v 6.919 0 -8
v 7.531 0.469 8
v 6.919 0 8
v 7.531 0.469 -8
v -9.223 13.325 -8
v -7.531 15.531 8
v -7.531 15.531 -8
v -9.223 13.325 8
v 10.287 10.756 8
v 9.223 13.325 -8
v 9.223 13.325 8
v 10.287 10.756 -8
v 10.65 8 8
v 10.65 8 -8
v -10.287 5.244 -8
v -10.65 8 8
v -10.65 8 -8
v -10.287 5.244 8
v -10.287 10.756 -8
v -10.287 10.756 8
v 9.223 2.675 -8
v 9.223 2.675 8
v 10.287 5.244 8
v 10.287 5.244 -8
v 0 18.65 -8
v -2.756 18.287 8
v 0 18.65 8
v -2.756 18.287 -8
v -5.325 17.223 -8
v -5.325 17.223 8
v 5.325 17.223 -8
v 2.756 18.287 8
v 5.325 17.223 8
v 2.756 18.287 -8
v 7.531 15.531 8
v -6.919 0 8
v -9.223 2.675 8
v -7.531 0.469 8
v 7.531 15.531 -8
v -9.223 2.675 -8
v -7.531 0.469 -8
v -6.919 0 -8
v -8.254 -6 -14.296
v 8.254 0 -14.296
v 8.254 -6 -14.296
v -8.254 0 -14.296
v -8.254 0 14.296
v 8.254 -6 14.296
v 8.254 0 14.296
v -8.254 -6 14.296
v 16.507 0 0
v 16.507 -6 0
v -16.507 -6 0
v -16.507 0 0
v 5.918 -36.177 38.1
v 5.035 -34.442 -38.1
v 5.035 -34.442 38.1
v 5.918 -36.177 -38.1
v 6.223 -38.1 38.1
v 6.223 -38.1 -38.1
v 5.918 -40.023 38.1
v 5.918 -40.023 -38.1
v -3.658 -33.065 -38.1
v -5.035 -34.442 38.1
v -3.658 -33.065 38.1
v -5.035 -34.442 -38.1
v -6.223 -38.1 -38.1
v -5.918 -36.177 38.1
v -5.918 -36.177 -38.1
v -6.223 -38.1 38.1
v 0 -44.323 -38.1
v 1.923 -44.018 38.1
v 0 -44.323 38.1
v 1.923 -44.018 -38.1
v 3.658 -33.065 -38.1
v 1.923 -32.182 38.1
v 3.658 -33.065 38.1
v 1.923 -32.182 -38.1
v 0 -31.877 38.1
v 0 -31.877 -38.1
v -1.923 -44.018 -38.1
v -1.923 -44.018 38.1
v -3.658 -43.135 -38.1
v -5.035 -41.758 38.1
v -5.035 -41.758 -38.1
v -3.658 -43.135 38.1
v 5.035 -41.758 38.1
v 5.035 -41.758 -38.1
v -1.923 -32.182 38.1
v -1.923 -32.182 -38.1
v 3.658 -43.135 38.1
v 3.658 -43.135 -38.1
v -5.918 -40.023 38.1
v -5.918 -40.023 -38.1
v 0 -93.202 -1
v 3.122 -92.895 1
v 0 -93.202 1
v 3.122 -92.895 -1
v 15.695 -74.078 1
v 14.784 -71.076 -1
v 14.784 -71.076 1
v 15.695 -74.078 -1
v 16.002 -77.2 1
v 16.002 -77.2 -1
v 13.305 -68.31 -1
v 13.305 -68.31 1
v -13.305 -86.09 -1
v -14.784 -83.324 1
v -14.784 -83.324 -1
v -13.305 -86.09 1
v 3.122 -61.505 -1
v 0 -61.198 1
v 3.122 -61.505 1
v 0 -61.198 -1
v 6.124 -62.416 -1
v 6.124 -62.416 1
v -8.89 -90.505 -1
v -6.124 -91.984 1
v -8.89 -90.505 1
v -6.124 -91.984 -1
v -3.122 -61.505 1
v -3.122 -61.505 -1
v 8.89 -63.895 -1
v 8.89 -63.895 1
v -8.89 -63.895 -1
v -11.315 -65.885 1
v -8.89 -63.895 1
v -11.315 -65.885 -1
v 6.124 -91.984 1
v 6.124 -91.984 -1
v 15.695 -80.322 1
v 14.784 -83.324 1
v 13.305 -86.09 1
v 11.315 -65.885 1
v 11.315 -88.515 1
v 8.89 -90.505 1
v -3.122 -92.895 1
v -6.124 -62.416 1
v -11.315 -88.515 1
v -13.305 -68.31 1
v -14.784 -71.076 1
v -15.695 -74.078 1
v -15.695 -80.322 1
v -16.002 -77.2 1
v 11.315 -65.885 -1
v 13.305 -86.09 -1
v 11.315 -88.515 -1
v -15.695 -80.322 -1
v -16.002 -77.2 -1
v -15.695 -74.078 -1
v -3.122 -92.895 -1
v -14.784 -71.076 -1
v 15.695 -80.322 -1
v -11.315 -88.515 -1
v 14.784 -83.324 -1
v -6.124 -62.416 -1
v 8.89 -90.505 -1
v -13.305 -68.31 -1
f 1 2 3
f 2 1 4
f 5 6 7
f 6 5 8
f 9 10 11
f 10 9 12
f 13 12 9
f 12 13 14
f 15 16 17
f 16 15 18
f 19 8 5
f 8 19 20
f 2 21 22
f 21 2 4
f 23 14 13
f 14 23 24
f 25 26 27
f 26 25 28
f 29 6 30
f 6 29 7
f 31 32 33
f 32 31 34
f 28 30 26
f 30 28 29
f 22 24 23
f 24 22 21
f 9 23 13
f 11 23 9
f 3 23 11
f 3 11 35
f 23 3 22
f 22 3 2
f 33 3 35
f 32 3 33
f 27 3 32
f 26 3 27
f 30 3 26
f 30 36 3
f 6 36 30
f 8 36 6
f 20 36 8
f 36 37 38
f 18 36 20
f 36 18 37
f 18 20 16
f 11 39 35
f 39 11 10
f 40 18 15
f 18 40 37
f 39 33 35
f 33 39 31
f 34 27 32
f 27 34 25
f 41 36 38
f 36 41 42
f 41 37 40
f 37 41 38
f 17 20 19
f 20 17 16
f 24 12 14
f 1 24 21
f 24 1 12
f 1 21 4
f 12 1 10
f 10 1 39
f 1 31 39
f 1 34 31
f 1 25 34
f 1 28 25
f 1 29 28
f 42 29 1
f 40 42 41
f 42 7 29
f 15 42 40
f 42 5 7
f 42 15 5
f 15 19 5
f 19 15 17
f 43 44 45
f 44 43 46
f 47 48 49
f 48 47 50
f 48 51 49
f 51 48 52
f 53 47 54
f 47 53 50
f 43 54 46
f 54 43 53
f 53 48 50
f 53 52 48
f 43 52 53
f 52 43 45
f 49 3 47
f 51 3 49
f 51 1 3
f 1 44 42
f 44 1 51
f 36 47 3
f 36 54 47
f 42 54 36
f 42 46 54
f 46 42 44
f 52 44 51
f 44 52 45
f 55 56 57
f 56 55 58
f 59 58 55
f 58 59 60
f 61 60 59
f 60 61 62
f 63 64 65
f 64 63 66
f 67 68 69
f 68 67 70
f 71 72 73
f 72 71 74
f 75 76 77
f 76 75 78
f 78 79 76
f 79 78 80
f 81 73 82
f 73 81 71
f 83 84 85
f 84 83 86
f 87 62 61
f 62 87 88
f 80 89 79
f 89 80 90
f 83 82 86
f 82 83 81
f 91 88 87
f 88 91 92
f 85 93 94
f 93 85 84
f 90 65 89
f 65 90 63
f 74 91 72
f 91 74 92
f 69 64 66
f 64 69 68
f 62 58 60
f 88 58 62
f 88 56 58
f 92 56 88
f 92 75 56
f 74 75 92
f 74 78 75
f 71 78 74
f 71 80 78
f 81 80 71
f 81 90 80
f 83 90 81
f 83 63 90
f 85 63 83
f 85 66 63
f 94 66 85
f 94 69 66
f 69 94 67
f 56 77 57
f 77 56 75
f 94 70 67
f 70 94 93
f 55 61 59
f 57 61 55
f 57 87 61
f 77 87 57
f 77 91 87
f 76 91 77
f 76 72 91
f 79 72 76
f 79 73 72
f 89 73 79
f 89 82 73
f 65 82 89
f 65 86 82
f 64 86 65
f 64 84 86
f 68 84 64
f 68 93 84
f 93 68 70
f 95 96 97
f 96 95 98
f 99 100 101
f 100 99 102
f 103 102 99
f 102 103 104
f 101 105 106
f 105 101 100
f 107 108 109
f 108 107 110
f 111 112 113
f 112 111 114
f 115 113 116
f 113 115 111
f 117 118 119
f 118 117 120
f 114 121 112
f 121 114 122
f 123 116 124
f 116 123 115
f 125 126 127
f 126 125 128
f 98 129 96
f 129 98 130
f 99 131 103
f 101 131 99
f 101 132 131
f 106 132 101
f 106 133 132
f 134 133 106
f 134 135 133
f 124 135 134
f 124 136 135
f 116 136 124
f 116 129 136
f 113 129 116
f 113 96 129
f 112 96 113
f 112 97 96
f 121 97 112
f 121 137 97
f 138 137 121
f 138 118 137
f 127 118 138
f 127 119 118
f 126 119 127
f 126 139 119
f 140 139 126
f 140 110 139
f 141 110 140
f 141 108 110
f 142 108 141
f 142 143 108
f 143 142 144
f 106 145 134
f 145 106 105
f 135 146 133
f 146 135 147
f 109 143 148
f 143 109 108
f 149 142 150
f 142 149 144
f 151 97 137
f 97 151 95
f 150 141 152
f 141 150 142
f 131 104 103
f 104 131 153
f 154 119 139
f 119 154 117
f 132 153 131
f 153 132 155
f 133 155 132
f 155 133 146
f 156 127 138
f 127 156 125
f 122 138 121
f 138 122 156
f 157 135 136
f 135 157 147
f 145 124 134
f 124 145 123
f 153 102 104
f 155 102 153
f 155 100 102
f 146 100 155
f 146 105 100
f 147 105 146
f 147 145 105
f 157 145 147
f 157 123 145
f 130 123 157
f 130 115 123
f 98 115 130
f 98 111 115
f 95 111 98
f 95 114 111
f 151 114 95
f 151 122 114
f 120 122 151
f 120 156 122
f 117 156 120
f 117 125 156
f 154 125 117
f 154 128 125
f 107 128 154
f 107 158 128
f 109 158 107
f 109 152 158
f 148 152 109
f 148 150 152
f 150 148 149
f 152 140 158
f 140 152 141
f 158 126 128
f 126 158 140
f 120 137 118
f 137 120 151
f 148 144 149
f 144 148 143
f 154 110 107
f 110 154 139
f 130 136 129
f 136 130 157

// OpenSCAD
// Auto-generated by scripts/author_from_manifest.py (Phase D.3).
// Source: data/phase_d_manifest.json (sku_intent='tyco-ty7226-esfr-pendent-k168-214f').
// Do not hand-edit — regenerate from the manifest.
//
// @part tyco_ty7226_esfr_pendent_k168_214f
// @kind sprinkler_head
// @category head.pendant.k168
// @display-name "Tyco TY7226 ESFR Pendent K16.8 214°F"
// @mfg tyco_fire_protection
// @mfg-pn TY7226
// @listing UL FM
// @hazard-classes ESFR
// @price-usd 58.00
// @install-minutes 12
// @crew journeyman
// @k-factor 16.8
// @orientation pendant
// @response quick
// @temperature 214F
// @param size_in number default=0.5 label="Size" unit="in"
// @port inlet position=[0,0.014,0] direction=[0,1,0] style=NPT_threaded size_in=0.75 role=drop

size_in = 0.5;
k_factor = 16.8;

length_mm   = 76.20;
body_dia_mm = 35.56;
thread_od   = 21.3;
thread_len  = 16;
deflector_d = body_dia_mm * 0.9;

 union() {
    translate([0, thread_len/2, 0])
        cylinder(h = thread_len, d = thread_od, center = true, $fn = 24);
    translate([0, -3, 0])
        rotate([90, 0, 0])
        cylinder(h = 6, d = thread_od * 1.55, $fn = 6, center = true);
    translate([0, -length_mm/2, 0])
        cylinder(h = length_mm, d = body_dia_mm * 0.35, center = true, $fn = 20);
    translate([0, -length_mm - 1, 0])
        cylinder(h = 2, d = deflector_d, center = true, $fn = 32);
}
